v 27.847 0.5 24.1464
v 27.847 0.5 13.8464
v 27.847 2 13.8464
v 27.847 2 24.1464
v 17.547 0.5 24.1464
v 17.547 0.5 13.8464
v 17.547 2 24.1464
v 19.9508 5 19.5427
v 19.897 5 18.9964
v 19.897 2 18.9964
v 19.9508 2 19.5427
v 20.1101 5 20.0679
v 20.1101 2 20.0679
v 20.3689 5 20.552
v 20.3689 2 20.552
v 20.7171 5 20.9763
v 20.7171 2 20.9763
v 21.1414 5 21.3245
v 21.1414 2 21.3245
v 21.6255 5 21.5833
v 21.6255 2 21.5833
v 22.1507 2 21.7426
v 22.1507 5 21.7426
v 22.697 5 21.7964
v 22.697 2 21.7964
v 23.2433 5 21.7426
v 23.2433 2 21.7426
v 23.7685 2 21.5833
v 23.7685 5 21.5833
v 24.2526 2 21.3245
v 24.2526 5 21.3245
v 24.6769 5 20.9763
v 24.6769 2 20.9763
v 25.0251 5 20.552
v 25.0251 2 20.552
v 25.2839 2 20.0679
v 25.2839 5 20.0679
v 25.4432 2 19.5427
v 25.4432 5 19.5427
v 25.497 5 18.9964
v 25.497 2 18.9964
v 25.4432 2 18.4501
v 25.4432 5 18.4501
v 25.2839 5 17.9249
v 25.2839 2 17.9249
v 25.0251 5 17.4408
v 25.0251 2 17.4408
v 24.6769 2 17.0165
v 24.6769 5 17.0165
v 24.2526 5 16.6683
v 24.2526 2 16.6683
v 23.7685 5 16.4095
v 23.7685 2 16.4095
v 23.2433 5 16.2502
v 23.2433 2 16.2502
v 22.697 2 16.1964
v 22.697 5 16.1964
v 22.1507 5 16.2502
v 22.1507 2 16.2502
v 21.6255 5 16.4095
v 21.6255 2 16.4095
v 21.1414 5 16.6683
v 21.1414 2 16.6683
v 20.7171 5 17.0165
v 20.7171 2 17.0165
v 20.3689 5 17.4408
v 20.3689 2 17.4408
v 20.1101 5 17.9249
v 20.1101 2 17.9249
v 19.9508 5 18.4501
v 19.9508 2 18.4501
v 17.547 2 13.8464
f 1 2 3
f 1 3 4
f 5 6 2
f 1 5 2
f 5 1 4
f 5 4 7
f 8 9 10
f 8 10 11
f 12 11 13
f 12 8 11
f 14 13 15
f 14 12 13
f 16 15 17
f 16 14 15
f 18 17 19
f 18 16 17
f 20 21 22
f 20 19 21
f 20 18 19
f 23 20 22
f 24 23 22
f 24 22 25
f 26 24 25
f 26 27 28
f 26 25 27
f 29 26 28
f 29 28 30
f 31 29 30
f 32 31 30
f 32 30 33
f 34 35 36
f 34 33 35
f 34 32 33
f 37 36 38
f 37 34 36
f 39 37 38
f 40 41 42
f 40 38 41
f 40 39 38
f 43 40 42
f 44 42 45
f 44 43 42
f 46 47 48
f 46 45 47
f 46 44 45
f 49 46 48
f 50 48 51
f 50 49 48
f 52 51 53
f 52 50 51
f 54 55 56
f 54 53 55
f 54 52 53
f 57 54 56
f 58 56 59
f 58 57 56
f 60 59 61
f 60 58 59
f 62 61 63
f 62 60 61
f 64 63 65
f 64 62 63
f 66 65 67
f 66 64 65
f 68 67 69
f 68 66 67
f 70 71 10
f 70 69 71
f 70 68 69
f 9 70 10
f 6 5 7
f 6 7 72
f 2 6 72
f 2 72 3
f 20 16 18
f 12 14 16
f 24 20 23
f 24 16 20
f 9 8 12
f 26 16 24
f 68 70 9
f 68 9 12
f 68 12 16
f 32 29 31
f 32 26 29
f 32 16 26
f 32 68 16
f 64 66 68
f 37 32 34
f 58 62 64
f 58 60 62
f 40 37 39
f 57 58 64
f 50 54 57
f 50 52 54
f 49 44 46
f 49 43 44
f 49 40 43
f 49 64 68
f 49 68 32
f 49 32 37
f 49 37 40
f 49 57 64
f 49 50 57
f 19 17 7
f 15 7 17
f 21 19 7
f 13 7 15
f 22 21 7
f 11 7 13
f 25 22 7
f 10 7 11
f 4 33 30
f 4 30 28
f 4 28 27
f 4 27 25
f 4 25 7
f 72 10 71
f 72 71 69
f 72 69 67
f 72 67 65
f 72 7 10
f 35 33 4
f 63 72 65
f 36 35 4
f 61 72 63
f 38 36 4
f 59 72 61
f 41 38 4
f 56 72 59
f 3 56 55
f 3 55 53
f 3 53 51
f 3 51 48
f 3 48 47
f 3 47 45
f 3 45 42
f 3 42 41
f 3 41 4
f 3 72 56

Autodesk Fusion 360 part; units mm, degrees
sketch "Schizzo1" plane through (0, 0, 0) normal (0, 1, 0) x (1, 0, 0)
  line L0 (19.547, -15.8464) -> (25.847, -15.8464)
  line L1 (25.847, -15.8464) -> (25.847, -22.1464)
  line L2 (25.847, -22.1464) -> (19.547, -22.1464)
  line L3 (19.547, -22.1464) -> (19.547, -15.8464)
  line L4 (27.847, -24.1464) -> (17.547, -24.1464)
  line L5 (17.547, -24.1464) -> (17.547, -13.8464)
  line L6 (17.547, -13.8464) -> (27.847, -13.8464)
  line L7 (27.847, -13.8464) -> (27.847, -24.1464)
  dimension "d1" = 6.3
  dimension "d2" = 6.3
  dimension "d3" = -2
extrude "Estrusione1" add sketch "Schizzo1" along normal blind 2 contours L0 L1 L2 L3 | L4 L5 L6 L7
extrude "Estrusione2" add sketch "Schizzo1" along normal blind 7 contours L0 L1 L2 L3
extrude "Estrusione3" cut 1 faces at (21.647, 7, 17.9464) along direction (0, -1, 0) blind 2
move_face "FacceDiOffset1" offset -0.15 4 faces at (21.647, 3, 15.8464) (19.547, 3, 20.0464) (23.747, 3, 22.1464) (25.847, 3, 17.9464)
extrude "Estrusione4" cut 1 faces at (25.697, 4, 19.9964) along direction (-1, 0, 0) blind 0.2
extrude "Estrusione5" cut 1 faces at (23.5637, 3, 15.9964) along direction (0, 0, 1) blind 0.2
extrude "Estrusione6" cut 1 faces at (19.697, 3, 20.063) along direction (1, 0, 0) blind 0.2
extrude "Estrusione7" cut 1 faces at (23.6304, 4, 21.9964) along direction (0, 0, -1) blind 0.2
extrude "Estrusione8" cut 1 faces at (24.4137, 0, 17.2797) along direction (0, 1, 0) blind 0.5
sketch "Schizzo2" plane through (0, 5, 0) normal (0, 1, 0) x (-1, 0, 0)
  line L0 (-19.897, 21.7964) -> (-25.497, 21.7964)
  line L1 (-25.497, 21.7964) -> (-25.497, 16.1964)
  line L2 (-25.497, 16.1964) -> (-19.897, 16.1964)
  line L3 (-19.897, 16.1964) -> (-19.897, 21.7964)
  circle A0 centre (-22.697, 18.9964) radius 2.8
extrude "Estrusione9" cut sketch "Schizzo2" against normal blind 3 contours L0 L3 A0 | L0 L1 A0 | L2 L3 A0 | L1 L2 A0
